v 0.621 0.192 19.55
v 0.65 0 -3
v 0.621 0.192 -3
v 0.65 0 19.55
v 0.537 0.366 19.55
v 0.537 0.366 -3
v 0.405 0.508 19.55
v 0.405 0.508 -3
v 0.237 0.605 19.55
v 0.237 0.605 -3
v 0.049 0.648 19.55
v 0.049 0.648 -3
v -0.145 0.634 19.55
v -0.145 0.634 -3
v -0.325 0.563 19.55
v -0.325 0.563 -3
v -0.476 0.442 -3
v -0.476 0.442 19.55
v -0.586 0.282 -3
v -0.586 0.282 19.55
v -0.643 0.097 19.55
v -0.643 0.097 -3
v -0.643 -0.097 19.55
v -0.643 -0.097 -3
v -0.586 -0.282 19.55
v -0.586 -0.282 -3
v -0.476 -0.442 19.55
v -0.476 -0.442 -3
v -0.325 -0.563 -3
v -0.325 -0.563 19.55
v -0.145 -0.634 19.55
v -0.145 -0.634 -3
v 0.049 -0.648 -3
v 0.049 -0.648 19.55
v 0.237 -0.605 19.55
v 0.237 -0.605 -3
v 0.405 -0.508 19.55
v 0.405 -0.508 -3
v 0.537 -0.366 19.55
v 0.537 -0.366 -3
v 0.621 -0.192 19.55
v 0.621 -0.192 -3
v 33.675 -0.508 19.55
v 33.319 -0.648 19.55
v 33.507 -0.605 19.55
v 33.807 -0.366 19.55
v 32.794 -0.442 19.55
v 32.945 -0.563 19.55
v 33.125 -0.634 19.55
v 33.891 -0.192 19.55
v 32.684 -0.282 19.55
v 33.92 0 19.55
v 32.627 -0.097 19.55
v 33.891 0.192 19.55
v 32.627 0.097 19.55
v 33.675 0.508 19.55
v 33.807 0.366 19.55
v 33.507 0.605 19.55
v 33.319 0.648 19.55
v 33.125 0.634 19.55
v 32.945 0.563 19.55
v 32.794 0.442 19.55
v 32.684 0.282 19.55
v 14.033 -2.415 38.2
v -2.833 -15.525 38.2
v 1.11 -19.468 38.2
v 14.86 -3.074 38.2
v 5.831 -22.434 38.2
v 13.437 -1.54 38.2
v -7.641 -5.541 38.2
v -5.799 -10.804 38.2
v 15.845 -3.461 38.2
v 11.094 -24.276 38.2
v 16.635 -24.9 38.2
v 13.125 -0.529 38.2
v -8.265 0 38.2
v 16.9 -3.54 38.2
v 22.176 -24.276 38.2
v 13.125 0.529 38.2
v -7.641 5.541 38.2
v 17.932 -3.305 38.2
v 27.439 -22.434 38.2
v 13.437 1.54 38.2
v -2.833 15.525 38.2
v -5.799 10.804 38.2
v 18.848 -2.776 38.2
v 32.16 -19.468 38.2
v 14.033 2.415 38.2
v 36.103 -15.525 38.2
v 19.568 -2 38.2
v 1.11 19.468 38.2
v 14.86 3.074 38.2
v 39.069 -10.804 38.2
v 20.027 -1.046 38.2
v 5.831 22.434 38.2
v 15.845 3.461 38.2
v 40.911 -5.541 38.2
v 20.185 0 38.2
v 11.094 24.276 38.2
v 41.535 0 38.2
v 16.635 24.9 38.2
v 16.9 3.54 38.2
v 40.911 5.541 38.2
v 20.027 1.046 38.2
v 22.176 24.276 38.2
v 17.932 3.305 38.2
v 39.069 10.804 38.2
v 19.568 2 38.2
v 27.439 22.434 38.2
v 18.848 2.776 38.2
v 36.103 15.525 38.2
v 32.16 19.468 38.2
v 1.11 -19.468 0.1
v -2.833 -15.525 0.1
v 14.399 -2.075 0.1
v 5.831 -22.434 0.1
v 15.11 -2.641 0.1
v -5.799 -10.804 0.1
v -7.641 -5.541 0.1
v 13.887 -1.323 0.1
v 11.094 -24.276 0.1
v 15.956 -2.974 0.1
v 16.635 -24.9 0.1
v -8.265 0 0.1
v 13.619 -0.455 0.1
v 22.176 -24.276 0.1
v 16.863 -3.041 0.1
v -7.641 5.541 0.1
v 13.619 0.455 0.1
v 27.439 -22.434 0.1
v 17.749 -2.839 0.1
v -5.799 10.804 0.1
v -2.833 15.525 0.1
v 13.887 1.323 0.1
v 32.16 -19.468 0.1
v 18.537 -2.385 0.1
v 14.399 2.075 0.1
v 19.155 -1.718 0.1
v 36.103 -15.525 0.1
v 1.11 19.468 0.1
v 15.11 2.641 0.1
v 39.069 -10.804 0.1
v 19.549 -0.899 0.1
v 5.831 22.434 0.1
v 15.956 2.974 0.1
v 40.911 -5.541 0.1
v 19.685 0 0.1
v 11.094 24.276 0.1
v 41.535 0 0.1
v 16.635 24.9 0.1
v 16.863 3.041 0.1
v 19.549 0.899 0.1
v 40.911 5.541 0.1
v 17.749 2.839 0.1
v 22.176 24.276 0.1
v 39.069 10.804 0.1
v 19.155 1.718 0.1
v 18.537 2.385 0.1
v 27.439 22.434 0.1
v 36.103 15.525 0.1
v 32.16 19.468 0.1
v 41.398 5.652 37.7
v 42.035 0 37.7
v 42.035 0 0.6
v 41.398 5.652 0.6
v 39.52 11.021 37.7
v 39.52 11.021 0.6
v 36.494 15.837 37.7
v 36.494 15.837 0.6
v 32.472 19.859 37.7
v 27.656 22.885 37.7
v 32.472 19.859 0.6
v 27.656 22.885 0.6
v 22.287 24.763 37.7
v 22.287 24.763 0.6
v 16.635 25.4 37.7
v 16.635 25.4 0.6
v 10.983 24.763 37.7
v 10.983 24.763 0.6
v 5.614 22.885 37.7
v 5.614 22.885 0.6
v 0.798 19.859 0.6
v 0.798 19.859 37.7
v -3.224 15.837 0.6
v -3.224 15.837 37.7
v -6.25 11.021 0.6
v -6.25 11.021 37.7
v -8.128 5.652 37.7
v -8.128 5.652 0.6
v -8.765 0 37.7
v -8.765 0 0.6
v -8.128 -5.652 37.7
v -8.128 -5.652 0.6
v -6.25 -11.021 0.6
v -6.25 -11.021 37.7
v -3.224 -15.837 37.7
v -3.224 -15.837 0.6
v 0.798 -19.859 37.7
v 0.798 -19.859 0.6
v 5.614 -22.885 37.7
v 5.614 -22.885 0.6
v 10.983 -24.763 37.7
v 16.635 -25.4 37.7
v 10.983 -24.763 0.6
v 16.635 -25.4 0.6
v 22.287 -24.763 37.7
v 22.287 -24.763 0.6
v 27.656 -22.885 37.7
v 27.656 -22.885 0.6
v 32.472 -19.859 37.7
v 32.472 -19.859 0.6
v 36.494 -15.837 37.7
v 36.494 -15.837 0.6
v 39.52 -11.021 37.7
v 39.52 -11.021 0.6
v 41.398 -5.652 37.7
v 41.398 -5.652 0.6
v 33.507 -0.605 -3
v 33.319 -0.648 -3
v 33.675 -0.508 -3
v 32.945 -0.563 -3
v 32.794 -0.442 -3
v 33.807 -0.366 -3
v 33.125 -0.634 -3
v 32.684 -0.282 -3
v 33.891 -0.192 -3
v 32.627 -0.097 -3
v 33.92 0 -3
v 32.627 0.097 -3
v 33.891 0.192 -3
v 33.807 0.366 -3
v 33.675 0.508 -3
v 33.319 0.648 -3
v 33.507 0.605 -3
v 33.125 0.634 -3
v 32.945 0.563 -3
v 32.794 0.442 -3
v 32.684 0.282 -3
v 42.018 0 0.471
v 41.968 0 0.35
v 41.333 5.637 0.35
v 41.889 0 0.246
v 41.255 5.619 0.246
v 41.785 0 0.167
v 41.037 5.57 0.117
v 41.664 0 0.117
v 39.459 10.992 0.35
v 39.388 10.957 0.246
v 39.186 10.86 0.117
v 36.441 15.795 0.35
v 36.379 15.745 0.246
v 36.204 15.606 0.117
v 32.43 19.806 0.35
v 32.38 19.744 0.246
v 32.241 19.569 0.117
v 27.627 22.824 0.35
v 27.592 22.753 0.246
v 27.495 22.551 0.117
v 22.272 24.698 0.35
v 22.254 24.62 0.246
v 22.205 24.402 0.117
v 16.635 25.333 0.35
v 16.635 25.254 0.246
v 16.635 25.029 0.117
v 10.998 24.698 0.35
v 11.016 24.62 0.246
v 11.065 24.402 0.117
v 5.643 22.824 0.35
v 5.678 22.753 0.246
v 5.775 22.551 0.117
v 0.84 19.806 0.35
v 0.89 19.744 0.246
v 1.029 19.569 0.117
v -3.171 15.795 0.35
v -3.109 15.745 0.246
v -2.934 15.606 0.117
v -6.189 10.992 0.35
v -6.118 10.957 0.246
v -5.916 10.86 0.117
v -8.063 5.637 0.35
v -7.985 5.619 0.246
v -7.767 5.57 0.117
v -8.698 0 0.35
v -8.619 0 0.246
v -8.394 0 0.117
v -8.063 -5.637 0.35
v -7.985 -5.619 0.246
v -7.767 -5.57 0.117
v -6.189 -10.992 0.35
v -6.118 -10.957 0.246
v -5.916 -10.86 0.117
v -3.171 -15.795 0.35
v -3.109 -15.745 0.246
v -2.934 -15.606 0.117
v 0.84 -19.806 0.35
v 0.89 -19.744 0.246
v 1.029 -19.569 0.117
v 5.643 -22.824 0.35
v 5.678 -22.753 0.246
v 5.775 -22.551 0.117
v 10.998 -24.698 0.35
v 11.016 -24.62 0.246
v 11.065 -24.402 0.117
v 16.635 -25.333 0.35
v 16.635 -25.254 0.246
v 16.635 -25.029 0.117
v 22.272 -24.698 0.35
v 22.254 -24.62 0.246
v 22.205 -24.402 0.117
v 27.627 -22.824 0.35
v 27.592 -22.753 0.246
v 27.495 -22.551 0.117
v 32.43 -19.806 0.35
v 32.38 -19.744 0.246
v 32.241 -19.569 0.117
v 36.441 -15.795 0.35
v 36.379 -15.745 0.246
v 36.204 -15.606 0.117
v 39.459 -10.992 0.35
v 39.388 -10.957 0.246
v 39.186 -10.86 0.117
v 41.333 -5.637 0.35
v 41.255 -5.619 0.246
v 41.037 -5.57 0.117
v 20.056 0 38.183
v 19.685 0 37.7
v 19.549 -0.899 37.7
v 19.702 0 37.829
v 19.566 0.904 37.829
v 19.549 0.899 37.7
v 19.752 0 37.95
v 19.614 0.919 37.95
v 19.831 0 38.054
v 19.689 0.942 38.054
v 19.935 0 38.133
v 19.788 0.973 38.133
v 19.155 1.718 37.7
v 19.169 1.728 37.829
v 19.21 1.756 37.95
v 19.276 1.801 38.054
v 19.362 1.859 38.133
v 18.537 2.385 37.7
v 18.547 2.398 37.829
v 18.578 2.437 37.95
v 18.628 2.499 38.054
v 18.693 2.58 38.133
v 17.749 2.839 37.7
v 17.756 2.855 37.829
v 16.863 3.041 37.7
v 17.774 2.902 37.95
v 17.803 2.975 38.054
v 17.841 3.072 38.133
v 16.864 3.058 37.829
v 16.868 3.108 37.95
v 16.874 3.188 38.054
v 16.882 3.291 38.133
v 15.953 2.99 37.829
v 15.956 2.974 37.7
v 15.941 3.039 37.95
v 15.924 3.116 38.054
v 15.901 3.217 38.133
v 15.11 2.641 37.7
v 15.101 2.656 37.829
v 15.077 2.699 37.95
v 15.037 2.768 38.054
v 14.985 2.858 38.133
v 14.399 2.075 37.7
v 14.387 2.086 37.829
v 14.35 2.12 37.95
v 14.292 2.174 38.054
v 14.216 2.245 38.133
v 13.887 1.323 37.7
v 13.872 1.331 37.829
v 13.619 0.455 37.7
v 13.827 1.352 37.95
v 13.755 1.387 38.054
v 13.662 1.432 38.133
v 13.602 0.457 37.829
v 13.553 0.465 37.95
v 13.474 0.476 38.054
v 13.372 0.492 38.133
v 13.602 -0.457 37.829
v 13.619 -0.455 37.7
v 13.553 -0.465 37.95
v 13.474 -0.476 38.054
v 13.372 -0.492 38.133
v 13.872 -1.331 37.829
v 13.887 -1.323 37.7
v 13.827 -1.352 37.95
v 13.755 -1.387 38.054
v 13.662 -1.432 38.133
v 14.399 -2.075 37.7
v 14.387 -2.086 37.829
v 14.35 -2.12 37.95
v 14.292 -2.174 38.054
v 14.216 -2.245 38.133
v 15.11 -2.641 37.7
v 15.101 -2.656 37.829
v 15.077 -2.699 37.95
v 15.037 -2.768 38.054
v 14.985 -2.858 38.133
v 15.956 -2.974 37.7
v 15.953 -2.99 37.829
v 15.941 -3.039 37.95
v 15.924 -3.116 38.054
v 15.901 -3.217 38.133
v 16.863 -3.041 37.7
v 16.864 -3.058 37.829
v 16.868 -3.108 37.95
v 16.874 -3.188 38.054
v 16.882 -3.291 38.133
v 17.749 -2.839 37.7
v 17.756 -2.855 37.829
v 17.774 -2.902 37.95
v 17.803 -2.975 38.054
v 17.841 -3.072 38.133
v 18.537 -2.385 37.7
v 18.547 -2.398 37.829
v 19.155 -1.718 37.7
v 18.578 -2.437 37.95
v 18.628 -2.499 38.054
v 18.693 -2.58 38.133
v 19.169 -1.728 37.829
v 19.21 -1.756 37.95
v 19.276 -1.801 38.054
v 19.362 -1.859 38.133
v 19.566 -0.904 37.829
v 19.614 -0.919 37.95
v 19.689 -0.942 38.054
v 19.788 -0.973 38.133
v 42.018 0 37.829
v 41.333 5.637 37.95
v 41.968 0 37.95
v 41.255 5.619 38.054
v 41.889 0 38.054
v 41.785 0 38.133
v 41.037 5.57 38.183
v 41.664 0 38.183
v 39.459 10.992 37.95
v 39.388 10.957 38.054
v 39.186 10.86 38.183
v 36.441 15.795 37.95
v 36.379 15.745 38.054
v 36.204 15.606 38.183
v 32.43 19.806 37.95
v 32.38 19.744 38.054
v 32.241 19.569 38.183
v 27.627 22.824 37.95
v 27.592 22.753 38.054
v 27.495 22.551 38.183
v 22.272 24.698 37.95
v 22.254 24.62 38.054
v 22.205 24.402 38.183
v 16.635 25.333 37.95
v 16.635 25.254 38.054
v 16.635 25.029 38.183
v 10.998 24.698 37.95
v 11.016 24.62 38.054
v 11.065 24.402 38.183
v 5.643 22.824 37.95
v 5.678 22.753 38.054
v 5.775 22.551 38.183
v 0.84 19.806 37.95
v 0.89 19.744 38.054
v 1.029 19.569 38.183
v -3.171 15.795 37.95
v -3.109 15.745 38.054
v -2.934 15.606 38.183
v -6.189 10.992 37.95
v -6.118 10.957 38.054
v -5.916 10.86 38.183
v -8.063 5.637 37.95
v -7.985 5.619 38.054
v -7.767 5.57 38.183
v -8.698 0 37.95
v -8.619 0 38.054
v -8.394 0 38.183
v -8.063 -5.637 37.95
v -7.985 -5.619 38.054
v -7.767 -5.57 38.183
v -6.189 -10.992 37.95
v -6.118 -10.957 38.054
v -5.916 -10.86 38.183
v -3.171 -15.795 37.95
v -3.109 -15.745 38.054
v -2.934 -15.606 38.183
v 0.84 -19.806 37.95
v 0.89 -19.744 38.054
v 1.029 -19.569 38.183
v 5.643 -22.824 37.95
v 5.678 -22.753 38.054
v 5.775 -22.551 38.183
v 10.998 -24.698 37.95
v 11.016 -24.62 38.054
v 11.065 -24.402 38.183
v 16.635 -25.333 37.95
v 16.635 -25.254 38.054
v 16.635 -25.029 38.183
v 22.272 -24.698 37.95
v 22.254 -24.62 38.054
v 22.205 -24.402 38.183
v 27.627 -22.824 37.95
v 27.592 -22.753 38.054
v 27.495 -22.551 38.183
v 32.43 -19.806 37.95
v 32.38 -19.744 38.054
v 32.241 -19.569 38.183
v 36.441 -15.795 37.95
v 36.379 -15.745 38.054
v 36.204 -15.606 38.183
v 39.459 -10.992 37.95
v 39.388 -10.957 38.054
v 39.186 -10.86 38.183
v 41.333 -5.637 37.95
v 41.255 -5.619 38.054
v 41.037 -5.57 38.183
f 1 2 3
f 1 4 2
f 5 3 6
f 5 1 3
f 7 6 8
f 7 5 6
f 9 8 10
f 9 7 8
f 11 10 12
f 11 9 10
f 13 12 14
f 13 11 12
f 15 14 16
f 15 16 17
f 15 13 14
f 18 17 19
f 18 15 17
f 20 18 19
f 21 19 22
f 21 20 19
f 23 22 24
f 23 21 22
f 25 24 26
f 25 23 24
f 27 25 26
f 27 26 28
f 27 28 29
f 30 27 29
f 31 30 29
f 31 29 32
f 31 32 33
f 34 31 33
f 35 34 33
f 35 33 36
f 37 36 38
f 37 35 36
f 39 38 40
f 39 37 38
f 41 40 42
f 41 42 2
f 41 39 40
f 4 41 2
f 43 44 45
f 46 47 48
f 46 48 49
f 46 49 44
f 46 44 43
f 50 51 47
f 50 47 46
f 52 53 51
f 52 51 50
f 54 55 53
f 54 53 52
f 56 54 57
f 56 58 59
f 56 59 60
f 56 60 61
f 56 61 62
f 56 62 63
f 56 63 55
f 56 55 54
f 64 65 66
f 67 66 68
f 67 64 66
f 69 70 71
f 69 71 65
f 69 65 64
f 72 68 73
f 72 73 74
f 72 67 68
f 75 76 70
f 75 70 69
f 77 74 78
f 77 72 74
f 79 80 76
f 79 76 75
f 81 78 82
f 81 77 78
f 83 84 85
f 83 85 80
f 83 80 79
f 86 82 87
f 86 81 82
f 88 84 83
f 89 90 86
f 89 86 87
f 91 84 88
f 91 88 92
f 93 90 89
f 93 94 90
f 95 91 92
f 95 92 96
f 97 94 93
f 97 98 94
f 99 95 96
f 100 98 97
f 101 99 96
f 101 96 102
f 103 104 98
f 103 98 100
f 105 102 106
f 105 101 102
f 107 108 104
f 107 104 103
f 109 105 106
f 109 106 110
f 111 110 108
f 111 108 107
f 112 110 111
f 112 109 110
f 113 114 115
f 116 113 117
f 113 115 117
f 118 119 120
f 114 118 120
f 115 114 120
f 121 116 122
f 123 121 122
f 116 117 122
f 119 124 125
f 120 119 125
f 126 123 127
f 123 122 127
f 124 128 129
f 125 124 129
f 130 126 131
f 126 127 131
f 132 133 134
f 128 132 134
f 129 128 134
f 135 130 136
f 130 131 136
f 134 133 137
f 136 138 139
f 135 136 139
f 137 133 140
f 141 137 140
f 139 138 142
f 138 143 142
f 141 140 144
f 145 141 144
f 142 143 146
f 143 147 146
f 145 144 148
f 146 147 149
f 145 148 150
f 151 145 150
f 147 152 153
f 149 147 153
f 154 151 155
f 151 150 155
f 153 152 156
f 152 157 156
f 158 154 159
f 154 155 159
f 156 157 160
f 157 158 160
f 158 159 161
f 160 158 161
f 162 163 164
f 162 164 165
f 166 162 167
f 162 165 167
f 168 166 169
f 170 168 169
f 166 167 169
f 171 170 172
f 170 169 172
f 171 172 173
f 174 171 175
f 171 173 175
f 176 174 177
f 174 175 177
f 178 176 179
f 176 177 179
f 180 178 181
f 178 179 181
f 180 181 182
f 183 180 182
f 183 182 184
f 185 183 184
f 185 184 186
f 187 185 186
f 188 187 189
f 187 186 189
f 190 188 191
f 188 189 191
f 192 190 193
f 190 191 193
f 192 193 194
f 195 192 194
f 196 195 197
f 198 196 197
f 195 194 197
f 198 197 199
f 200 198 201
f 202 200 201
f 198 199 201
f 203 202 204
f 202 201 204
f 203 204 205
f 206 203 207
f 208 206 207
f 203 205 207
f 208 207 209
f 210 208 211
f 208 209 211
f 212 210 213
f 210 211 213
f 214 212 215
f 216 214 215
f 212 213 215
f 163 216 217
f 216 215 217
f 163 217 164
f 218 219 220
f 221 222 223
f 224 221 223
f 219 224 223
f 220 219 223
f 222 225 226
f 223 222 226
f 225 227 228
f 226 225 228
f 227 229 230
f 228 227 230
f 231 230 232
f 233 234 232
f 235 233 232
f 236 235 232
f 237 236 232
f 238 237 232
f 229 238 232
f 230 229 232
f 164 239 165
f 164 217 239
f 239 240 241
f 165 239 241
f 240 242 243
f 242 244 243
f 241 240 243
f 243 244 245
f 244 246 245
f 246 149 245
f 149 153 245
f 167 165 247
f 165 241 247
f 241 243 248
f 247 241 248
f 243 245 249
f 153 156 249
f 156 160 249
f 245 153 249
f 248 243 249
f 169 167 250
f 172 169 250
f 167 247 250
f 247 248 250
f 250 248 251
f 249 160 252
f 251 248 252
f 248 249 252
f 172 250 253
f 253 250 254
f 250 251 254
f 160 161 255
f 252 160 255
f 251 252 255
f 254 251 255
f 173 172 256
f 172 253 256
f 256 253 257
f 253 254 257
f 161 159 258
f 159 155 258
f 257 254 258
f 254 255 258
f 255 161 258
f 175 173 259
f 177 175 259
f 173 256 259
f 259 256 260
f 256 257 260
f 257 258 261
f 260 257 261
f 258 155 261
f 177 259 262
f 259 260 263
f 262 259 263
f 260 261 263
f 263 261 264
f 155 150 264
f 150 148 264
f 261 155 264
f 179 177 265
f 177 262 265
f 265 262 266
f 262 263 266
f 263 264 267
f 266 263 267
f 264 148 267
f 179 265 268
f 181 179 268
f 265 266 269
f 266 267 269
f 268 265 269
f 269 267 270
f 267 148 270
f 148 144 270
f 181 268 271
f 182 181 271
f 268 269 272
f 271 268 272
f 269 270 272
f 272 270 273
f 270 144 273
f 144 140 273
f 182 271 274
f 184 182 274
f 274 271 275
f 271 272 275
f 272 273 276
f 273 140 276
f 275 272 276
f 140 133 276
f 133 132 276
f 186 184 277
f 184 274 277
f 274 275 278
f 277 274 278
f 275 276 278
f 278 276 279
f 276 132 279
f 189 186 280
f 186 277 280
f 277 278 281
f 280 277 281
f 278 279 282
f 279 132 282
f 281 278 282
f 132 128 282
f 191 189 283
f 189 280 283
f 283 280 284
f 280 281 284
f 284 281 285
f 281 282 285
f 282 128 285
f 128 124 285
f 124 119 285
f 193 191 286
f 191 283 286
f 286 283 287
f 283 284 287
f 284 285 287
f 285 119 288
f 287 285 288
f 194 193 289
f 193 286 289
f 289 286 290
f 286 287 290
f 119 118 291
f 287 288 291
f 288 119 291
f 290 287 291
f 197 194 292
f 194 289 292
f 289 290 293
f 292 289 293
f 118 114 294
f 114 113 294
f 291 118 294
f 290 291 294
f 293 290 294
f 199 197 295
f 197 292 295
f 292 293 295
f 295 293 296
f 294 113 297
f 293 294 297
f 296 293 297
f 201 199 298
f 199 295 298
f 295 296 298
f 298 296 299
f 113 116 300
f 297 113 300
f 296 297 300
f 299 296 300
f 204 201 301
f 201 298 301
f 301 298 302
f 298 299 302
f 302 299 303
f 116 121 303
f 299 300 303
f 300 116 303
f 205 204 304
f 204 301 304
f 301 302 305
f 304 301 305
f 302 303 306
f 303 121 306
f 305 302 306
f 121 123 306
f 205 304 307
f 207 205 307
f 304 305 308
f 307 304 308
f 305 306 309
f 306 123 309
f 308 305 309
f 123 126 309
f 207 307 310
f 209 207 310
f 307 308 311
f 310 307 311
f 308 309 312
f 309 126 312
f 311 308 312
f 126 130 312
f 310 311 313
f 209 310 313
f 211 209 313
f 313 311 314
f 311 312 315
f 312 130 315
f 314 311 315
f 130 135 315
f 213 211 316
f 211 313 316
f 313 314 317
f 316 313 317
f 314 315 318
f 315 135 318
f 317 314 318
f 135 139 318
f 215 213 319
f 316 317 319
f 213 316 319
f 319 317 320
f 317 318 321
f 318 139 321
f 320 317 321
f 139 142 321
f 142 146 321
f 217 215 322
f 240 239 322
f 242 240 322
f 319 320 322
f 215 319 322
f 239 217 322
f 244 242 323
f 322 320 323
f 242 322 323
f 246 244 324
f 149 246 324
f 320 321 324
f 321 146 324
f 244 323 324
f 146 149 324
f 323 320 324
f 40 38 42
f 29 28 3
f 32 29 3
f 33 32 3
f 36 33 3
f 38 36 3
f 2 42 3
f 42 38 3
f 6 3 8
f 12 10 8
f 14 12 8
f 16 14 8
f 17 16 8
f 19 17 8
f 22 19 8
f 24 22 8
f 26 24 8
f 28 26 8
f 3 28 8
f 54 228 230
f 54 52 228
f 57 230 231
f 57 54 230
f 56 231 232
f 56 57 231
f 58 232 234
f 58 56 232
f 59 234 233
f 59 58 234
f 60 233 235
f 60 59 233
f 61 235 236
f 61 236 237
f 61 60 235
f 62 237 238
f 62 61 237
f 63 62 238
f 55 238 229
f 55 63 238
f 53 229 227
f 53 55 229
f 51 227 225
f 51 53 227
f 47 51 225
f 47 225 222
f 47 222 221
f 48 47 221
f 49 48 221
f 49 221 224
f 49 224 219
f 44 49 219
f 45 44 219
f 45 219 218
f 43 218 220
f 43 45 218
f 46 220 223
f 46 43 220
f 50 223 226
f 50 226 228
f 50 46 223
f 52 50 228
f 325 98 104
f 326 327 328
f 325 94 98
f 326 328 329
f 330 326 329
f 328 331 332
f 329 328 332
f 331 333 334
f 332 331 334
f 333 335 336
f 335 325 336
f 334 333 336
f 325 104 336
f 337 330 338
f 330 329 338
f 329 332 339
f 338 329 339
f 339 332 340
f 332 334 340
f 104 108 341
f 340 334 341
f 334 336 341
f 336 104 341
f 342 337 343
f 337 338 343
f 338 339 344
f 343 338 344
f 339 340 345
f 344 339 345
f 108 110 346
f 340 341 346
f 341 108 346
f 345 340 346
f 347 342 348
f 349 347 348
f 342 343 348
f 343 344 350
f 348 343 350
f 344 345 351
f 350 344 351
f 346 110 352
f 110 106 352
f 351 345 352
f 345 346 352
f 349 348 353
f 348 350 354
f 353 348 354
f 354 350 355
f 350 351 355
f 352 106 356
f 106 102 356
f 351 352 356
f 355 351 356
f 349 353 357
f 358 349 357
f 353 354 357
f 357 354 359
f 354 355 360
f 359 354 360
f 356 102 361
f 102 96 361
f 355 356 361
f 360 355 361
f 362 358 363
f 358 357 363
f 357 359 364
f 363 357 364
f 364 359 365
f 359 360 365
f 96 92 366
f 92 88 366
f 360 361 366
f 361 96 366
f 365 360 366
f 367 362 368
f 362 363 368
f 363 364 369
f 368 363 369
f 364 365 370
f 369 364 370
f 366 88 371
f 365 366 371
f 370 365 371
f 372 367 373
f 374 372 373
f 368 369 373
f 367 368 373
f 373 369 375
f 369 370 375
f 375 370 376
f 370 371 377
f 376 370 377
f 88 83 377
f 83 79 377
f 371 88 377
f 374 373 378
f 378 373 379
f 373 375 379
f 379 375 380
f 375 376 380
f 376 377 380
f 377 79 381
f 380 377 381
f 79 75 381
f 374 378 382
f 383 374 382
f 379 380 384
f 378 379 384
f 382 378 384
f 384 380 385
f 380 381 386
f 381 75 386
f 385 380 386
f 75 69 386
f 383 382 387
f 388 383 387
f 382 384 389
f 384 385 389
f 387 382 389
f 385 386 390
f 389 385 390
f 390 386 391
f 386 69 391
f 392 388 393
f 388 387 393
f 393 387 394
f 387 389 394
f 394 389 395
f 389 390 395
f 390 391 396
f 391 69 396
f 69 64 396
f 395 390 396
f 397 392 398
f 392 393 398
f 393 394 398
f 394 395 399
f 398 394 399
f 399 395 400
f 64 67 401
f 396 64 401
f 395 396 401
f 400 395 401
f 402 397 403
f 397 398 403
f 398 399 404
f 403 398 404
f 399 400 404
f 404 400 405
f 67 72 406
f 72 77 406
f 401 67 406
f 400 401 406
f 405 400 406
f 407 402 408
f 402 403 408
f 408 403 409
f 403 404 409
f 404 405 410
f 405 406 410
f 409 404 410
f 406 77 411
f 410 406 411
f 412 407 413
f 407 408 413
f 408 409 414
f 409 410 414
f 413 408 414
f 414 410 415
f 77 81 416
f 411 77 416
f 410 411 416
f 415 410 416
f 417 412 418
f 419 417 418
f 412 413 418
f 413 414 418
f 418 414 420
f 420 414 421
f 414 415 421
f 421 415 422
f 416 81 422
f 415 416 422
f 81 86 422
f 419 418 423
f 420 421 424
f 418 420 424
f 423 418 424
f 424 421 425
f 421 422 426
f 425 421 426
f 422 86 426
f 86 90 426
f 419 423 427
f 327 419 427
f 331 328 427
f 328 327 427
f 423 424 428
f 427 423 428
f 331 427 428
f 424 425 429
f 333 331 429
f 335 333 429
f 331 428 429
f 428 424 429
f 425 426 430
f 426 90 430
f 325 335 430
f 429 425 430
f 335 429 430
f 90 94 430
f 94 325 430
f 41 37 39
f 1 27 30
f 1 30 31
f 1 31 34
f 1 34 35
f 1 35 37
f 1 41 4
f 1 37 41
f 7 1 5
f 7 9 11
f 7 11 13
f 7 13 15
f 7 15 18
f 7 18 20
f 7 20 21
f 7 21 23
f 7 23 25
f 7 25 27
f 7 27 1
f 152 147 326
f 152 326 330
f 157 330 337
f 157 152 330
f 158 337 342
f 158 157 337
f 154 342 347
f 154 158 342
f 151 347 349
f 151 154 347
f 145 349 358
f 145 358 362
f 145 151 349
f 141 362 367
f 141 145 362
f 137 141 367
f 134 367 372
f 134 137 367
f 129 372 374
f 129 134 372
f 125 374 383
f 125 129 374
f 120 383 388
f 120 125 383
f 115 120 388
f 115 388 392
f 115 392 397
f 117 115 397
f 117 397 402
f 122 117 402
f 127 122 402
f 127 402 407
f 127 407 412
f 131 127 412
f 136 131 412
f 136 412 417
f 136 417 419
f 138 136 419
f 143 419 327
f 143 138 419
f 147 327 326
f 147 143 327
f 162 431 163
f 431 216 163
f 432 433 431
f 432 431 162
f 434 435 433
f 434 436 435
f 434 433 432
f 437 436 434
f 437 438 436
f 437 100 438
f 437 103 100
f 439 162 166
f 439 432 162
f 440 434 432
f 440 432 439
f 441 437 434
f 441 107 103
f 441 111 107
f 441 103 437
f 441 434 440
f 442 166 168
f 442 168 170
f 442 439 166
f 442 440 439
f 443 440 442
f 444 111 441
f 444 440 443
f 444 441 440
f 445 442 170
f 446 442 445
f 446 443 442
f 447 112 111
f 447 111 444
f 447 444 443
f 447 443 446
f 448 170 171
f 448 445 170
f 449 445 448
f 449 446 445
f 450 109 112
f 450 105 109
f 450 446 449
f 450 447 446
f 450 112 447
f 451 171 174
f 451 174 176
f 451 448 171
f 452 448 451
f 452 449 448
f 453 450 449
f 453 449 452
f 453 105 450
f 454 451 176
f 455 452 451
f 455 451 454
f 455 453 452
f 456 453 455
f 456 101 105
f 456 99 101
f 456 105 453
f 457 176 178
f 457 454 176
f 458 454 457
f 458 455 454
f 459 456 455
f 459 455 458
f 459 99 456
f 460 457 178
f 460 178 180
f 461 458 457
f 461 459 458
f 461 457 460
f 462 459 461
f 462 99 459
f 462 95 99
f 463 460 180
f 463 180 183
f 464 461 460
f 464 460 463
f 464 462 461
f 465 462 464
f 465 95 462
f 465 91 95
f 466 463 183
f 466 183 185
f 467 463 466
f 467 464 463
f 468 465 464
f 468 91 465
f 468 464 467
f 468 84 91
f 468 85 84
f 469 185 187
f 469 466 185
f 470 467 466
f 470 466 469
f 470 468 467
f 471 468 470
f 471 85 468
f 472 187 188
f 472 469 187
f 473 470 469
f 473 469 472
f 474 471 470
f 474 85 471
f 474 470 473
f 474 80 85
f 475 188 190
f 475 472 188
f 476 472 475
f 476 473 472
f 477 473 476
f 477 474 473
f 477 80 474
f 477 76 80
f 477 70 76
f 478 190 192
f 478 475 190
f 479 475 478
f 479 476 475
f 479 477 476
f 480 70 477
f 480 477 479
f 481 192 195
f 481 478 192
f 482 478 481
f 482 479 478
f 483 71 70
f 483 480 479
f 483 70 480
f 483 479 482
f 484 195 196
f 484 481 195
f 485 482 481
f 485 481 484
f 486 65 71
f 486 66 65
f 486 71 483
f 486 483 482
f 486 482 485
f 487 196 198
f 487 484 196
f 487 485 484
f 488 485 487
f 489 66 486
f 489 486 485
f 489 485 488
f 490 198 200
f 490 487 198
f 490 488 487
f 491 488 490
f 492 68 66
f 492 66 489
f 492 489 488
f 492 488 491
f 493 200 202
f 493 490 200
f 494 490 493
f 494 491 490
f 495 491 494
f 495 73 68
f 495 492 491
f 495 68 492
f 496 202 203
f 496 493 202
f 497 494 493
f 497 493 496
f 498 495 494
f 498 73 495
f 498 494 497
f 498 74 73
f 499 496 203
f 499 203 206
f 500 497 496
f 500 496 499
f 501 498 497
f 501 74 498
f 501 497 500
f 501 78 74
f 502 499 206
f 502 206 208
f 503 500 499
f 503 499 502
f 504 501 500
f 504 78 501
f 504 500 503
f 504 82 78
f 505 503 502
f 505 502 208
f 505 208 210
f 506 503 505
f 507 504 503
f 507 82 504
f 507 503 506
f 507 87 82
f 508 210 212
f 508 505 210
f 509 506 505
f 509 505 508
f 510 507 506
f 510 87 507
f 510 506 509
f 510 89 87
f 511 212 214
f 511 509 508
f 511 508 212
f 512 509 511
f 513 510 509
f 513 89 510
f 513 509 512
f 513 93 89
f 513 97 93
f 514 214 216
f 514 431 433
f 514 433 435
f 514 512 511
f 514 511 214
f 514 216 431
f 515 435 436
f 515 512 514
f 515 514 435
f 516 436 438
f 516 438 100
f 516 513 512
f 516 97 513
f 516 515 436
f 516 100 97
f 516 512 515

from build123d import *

# Parameters (mm, degrees)
SKETCH001_R       = 0.65
PAD001_DEPTH      = 19.05
PAD001_DEPTH_BACK = 3.5
SKETCH_R          = 25.4
SKETCH_R_2        = 3.05
PAD_DEPTH         = 38.1
FILLET_R          = 0.5


with BuildPart() as pad001:
    # Sketch001 → Pad001 (new body, two sides)
    with BuildSketch(Plane.XY.offset(0.5)) as pad001_sk:
        Circle(SKETCH001_R)
        with Locations((33.27, 0)):
            Circle(SKETCH001_R)
    extrude(amount=PAD001_DEPTH)
    extrude(pad001_sk.sketch, amount=-PAD001_DEPTH_BACK)


with BuildPart() as fillet_body:
    # Sketch → Pad (new body)
    with BuildSketch(Plane.XY.offset(0.1)):
        with Locations((16.635, 0)):
            Circle(SKETCH_R)
        with Locations((16.635, 0)):
            Circle(SKETCH_R_2, mode=Mode.SUBTRACT)
    extrude(amount=PAD_DEPTH)

    # Fillet
    fillet_edges = [fillet_body.edges().sort_by_distance(p)[0] for p in [
        (13.585, 0, 38.2),
        (-8.765, 0, 38.2),
        (-8.765, 0, 0.1),
    ]]
    fillet(fillet_edges, radius=FILLET_R)


solid = Compound([pad001.part, fillet_body.part])
